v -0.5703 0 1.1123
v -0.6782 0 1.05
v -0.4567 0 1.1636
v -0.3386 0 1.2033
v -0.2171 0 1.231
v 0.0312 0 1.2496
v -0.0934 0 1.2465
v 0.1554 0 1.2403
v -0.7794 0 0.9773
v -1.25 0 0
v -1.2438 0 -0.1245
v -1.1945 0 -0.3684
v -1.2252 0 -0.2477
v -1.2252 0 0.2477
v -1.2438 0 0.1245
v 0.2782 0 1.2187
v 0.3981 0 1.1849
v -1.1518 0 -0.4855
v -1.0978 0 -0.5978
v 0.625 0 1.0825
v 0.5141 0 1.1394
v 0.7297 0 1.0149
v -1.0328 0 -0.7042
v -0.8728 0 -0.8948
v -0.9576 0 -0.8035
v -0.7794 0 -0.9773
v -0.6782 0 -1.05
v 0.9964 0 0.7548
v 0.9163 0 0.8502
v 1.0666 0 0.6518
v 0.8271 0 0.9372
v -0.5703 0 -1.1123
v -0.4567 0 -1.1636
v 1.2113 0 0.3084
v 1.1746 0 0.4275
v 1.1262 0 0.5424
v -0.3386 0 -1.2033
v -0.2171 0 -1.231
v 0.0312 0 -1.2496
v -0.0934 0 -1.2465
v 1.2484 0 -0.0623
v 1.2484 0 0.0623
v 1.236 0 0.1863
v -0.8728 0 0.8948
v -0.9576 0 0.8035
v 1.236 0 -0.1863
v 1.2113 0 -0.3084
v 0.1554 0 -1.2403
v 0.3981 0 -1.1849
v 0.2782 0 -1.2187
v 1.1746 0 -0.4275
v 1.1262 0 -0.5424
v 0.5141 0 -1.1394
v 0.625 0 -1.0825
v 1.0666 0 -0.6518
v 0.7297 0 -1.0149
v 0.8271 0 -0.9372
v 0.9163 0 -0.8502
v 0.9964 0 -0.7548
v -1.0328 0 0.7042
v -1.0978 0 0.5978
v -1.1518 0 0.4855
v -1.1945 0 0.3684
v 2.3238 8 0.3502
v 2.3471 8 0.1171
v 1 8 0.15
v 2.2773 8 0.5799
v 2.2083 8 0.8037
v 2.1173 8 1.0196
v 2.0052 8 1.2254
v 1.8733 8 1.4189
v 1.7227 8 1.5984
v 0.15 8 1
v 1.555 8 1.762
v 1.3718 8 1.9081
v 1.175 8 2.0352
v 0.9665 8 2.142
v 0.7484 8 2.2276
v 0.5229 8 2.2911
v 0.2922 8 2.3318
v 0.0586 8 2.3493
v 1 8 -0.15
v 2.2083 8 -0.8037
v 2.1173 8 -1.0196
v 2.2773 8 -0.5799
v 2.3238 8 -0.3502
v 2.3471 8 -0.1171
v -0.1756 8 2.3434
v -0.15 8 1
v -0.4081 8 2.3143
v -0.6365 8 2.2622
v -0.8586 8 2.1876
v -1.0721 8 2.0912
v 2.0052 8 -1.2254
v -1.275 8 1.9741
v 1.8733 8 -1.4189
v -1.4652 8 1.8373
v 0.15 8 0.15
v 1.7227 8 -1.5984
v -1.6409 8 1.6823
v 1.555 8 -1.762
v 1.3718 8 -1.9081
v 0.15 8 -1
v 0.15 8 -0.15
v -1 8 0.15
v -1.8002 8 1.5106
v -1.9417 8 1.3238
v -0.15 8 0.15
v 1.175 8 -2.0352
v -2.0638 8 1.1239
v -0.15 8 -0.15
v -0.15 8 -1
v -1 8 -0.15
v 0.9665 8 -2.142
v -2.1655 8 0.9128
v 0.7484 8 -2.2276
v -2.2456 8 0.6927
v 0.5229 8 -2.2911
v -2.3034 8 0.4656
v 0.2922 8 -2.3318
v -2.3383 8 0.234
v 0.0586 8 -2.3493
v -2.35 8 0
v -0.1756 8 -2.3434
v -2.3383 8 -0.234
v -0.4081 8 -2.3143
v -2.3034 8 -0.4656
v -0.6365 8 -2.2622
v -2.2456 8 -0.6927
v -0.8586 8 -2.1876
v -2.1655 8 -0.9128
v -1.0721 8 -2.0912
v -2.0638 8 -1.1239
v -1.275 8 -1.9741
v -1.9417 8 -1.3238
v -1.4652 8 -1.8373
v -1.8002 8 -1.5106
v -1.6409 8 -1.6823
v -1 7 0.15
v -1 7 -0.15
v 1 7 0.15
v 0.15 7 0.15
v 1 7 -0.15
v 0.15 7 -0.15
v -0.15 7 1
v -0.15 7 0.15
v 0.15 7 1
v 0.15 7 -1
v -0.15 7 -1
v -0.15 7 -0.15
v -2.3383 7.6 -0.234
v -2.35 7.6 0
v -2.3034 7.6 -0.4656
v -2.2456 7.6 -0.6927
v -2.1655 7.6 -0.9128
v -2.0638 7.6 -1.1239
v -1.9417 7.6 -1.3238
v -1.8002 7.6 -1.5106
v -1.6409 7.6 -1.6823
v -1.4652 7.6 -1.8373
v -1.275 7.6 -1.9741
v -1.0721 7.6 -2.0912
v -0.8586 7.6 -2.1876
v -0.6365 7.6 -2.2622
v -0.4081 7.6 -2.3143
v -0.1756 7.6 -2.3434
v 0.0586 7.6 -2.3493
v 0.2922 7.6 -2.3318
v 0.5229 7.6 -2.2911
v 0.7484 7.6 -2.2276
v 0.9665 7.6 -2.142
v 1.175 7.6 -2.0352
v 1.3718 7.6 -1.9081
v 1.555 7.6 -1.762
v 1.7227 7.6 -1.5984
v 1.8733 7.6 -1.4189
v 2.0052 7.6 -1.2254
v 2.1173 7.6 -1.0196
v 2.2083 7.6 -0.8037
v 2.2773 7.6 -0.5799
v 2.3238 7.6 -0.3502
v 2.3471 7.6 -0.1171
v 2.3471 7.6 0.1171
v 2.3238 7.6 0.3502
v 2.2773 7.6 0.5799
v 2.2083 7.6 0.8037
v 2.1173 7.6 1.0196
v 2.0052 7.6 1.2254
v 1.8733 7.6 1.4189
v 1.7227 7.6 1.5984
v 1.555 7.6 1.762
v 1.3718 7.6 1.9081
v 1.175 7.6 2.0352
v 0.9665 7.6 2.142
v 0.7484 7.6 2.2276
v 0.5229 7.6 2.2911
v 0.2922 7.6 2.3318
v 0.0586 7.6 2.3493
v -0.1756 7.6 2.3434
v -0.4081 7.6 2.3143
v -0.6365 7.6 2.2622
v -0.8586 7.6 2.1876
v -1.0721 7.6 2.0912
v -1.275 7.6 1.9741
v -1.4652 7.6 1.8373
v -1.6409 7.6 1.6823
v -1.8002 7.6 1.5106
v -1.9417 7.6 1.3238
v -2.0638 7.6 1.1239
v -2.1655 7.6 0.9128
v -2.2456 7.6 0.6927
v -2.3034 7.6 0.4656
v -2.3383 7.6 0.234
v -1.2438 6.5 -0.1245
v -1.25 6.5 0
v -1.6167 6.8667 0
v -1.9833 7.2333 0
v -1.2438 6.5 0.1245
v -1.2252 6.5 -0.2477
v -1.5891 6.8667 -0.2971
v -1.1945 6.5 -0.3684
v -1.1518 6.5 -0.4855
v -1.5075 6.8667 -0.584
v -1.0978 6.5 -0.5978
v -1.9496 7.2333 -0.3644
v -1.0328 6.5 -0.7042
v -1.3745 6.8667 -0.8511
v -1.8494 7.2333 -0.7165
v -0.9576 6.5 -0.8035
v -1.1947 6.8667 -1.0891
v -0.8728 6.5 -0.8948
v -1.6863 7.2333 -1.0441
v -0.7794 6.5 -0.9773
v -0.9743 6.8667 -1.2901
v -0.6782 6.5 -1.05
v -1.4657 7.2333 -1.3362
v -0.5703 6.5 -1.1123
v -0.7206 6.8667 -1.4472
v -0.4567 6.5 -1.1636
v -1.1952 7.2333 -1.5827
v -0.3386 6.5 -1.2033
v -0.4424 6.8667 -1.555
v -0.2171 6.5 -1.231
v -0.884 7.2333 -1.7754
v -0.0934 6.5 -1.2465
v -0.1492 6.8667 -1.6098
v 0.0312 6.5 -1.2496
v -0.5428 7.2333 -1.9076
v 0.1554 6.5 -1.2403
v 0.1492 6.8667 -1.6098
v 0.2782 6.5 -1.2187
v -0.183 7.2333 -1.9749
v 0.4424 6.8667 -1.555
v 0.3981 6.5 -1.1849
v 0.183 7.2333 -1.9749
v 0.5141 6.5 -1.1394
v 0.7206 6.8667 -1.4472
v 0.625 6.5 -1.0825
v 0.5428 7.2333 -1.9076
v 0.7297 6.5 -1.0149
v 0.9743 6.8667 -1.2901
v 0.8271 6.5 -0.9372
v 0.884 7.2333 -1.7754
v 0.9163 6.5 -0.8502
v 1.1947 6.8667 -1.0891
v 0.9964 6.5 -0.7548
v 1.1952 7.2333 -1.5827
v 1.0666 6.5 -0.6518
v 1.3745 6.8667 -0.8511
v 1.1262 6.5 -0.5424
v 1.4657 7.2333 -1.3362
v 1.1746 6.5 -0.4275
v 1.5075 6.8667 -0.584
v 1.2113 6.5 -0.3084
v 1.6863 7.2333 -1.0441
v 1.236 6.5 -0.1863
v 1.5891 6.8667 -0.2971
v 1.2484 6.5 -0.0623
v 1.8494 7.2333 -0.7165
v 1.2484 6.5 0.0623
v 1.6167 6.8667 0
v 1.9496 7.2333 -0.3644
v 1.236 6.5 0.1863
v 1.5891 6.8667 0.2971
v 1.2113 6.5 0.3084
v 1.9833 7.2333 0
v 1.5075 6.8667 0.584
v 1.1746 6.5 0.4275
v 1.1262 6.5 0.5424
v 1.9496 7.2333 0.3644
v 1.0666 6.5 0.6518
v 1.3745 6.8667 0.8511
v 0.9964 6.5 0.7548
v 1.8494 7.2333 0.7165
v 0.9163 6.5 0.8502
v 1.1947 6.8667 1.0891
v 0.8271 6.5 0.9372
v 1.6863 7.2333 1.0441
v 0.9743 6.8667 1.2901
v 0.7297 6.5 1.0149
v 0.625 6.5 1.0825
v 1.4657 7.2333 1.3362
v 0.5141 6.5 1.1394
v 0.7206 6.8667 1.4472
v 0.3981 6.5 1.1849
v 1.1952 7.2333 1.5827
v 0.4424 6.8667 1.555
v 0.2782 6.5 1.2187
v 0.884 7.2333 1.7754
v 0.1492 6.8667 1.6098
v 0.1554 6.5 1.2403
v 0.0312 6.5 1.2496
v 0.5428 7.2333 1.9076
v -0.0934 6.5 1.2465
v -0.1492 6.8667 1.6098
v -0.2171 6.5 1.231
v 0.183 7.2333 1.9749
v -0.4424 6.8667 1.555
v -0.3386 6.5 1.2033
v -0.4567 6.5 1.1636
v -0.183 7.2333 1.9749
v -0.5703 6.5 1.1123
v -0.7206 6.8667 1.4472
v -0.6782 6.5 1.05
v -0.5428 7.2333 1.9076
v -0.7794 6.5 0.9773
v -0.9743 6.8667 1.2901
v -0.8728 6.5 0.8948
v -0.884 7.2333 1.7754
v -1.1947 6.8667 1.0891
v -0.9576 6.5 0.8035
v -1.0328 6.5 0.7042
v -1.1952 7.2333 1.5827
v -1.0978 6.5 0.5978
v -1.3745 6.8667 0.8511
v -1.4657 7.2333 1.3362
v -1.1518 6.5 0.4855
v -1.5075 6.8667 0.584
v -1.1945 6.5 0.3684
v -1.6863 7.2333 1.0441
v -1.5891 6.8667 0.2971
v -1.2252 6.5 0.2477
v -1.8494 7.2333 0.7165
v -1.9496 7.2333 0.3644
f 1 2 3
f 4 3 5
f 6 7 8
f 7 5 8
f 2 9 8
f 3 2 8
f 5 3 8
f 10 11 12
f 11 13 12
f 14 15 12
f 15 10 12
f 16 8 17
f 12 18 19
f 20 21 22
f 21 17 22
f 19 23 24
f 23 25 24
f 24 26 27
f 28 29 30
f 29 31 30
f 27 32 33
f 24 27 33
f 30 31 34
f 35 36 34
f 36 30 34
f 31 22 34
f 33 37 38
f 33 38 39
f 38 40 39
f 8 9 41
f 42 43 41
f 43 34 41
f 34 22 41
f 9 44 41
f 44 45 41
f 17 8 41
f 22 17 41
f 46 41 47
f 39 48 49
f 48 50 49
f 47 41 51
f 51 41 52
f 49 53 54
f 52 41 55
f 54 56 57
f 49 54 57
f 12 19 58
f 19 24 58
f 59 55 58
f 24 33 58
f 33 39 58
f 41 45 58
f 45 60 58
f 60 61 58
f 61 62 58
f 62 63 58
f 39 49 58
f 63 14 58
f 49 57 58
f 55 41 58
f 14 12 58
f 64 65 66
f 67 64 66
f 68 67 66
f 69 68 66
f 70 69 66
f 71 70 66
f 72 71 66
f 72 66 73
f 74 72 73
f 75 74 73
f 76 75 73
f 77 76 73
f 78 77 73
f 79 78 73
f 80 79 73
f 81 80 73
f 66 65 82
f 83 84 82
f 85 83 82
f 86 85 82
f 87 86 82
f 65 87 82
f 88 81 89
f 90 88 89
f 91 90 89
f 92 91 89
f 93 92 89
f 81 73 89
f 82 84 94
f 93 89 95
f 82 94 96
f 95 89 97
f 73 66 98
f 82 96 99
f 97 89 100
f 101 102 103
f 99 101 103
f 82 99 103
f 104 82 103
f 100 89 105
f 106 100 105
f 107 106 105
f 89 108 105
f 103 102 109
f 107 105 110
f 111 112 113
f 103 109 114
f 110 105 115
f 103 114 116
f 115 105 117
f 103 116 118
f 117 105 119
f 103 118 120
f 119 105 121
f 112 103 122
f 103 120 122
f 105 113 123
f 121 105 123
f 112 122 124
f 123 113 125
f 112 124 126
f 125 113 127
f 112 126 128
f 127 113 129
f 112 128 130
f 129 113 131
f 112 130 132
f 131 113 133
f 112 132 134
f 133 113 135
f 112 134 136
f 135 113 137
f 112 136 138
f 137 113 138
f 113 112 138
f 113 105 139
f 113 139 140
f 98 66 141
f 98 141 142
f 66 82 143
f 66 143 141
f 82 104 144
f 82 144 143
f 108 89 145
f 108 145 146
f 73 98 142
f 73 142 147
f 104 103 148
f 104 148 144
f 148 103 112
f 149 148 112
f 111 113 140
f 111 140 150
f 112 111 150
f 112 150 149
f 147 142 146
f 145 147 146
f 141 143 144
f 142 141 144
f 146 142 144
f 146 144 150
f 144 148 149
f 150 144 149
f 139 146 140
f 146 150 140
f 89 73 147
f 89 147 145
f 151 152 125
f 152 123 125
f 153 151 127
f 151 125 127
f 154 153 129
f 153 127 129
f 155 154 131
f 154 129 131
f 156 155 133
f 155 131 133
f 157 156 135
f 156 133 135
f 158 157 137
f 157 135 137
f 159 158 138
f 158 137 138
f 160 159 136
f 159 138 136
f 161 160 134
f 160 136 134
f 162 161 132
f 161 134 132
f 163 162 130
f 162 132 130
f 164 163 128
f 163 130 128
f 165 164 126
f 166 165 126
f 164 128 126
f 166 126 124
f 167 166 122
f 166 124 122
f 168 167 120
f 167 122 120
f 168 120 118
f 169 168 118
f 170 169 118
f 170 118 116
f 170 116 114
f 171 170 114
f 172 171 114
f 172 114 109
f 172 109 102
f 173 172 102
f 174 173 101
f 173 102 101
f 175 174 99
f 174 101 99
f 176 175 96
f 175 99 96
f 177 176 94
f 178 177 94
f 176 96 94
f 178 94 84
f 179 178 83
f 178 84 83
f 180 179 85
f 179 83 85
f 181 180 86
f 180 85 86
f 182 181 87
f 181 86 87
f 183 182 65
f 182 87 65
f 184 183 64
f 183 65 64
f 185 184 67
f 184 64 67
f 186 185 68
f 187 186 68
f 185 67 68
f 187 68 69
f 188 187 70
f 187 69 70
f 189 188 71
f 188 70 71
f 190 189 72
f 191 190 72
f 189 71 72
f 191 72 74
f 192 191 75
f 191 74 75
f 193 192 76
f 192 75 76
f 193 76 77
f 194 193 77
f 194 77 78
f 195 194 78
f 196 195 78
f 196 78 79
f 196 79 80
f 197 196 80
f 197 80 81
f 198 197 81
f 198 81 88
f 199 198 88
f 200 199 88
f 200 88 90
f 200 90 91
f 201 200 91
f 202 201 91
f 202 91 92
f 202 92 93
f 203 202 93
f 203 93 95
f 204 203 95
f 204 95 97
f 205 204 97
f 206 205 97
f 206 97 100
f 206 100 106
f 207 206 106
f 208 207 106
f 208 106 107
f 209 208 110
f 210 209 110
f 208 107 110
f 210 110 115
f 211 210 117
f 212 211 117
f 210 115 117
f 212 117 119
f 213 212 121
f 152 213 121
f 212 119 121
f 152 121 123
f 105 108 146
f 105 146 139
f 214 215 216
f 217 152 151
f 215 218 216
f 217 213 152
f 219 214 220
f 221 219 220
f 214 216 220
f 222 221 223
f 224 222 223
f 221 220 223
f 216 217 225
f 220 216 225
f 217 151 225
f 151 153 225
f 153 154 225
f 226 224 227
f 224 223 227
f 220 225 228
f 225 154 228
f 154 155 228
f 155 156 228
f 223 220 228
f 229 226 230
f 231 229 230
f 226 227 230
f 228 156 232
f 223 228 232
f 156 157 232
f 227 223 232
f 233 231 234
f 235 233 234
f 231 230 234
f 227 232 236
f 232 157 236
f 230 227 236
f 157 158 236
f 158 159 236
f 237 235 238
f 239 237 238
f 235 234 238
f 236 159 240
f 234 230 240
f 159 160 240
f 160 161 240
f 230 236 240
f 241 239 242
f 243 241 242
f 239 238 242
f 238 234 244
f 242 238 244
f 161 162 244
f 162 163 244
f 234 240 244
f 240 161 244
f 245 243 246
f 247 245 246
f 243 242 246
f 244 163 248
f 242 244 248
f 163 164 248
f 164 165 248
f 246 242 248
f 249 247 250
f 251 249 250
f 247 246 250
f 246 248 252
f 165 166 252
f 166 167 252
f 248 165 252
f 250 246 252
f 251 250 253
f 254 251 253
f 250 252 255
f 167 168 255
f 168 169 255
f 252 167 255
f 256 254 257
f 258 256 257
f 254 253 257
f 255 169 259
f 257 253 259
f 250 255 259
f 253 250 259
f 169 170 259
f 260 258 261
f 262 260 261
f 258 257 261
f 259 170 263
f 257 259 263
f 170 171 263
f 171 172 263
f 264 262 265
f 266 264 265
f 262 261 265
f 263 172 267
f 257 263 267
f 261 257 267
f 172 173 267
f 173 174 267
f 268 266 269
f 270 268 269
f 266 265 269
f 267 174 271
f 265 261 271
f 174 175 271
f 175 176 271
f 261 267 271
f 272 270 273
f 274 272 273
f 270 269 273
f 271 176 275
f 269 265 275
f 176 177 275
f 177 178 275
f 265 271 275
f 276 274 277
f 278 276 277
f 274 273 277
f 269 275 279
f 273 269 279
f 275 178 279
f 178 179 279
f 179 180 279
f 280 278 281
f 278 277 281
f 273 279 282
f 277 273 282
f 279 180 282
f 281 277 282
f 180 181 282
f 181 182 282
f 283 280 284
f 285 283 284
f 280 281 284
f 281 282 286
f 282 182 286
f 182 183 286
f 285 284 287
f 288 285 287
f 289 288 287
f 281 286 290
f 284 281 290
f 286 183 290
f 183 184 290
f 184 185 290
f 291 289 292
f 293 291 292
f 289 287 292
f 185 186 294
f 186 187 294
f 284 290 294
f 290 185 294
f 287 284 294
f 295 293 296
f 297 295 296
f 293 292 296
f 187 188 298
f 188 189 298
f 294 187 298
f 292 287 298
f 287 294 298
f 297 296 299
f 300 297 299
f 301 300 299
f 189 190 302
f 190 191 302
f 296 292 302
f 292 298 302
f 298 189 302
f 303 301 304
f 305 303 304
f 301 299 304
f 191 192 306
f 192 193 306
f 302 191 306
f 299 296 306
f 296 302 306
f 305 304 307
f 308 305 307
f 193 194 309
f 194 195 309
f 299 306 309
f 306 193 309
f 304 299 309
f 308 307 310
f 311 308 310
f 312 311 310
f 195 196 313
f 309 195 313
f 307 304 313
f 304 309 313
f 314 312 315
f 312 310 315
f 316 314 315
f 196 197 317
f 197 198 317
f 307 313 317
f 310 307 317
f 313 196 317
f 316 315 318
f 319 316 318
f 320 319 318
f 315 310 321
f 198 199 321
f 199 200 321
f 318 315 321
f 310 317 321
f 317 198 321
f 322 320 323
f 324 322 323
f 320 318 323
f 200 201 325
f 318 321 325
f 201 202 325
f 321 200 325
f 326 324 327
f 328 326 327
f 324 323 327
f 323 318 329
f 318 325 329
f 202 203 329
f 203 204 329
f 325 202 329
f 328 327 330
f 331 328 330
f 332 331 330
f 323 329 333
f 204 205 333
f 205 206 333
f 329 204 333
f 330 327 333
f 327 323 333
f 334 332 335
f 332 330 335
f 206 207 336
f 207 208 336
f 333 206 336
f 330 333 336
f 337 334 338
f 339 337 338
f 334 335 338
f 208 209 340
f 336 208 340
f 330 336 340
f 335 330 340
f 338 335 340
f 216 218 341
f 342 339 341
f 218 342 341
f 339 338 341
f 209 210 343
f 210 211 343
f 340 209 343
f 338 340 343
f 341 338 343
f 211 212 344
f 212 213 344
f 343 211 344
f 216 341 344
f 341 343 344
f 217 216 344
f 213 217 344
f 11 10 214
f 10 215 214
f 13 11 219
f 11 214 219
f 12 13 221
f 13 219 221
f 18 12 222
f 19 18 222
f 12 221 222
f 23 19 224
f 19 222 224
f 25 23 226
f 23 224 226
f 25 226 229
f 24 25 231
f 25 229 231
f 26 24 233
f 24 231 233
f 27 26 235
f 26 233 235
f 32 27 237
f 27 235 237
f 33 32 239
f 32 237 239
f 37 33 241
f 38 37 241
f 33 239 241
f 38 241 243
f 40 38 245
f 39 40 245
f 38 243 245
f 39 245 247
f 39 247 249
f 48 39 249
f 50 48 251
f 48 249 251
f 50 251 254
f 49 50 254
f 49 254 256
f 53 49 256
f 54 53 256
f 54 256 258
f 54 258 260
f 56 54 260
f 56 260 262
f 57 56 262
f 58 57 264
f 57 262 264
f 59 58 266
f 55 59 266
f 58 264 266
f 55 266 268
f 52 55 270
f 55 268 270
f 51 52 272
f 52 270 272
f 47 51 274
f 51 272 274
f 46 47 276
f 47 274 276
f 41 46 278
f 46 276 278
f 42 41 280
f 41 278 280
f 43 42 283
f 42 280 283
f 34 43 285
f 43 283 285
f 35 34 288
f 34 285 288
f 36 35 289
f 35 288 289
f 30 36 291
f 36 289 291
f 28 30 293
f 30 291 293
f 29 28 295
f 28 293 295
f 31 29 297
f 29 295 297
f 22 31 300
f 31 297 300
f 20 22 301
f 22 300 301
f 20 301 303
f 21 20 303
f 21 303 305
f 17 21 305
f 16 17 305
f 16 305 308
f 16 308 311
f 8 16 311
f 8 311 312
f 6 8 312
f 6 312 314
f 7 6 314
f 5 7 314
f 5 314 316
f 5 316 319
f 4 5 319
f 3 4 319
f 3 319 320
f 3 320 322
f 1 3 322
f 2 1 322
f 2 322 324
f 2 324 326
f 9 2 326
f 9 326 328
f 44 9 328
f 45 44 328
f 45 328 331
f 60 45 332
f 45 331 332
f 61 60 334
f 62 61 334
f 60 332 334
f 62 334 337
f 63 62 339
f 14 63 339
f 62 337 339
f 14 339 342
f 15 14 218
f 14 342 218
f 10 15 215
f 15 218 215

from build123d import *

# Parameters (mm, degrees)
CUT_EXTRUDE1_DEPTH = 1


with BuildPart() as part:
    # Sketch1 → Revolve1 (revolve)
    with BuildSketch(Plane.XY, mode=Mode.PRIVATE) as revolve1_sk:
        Polygon((0, 0), (1.25, 0), (1.25, 6.5), (2.35, 7.6), (2.35, 8), (0, 8), align=None)
    revolve(revolve1_sk.sketch.rotate(Axis((0, 8, 0), (0, -1, 0)), 180), axis=Axis((0, 8, 0), (0, -1, 0)))

    # Sketch2 → Cut-Extrude1 (cut)
    with BuildSketch(Plane(origin=(0, 8, 0), x_dir=(1, 0, 0), z_dir=(0, 1, 0))):
        Polygon((0, 1), (0.15, 1), (0.15, 0.15), (1, 0.15), (1, -0.15), (0.15, -0.15), (0.15, -1), (-0.15, -1), (-0.15, -0.15), (-1, -0.15), (-1, 0.15), (-0.15, 0.15), (-0.15, 1), align=None)
    extrude(amount=-CUT_EXTRUDE1_DEPTH, mode=Mode.SUBTRACT)


solid = part.part
